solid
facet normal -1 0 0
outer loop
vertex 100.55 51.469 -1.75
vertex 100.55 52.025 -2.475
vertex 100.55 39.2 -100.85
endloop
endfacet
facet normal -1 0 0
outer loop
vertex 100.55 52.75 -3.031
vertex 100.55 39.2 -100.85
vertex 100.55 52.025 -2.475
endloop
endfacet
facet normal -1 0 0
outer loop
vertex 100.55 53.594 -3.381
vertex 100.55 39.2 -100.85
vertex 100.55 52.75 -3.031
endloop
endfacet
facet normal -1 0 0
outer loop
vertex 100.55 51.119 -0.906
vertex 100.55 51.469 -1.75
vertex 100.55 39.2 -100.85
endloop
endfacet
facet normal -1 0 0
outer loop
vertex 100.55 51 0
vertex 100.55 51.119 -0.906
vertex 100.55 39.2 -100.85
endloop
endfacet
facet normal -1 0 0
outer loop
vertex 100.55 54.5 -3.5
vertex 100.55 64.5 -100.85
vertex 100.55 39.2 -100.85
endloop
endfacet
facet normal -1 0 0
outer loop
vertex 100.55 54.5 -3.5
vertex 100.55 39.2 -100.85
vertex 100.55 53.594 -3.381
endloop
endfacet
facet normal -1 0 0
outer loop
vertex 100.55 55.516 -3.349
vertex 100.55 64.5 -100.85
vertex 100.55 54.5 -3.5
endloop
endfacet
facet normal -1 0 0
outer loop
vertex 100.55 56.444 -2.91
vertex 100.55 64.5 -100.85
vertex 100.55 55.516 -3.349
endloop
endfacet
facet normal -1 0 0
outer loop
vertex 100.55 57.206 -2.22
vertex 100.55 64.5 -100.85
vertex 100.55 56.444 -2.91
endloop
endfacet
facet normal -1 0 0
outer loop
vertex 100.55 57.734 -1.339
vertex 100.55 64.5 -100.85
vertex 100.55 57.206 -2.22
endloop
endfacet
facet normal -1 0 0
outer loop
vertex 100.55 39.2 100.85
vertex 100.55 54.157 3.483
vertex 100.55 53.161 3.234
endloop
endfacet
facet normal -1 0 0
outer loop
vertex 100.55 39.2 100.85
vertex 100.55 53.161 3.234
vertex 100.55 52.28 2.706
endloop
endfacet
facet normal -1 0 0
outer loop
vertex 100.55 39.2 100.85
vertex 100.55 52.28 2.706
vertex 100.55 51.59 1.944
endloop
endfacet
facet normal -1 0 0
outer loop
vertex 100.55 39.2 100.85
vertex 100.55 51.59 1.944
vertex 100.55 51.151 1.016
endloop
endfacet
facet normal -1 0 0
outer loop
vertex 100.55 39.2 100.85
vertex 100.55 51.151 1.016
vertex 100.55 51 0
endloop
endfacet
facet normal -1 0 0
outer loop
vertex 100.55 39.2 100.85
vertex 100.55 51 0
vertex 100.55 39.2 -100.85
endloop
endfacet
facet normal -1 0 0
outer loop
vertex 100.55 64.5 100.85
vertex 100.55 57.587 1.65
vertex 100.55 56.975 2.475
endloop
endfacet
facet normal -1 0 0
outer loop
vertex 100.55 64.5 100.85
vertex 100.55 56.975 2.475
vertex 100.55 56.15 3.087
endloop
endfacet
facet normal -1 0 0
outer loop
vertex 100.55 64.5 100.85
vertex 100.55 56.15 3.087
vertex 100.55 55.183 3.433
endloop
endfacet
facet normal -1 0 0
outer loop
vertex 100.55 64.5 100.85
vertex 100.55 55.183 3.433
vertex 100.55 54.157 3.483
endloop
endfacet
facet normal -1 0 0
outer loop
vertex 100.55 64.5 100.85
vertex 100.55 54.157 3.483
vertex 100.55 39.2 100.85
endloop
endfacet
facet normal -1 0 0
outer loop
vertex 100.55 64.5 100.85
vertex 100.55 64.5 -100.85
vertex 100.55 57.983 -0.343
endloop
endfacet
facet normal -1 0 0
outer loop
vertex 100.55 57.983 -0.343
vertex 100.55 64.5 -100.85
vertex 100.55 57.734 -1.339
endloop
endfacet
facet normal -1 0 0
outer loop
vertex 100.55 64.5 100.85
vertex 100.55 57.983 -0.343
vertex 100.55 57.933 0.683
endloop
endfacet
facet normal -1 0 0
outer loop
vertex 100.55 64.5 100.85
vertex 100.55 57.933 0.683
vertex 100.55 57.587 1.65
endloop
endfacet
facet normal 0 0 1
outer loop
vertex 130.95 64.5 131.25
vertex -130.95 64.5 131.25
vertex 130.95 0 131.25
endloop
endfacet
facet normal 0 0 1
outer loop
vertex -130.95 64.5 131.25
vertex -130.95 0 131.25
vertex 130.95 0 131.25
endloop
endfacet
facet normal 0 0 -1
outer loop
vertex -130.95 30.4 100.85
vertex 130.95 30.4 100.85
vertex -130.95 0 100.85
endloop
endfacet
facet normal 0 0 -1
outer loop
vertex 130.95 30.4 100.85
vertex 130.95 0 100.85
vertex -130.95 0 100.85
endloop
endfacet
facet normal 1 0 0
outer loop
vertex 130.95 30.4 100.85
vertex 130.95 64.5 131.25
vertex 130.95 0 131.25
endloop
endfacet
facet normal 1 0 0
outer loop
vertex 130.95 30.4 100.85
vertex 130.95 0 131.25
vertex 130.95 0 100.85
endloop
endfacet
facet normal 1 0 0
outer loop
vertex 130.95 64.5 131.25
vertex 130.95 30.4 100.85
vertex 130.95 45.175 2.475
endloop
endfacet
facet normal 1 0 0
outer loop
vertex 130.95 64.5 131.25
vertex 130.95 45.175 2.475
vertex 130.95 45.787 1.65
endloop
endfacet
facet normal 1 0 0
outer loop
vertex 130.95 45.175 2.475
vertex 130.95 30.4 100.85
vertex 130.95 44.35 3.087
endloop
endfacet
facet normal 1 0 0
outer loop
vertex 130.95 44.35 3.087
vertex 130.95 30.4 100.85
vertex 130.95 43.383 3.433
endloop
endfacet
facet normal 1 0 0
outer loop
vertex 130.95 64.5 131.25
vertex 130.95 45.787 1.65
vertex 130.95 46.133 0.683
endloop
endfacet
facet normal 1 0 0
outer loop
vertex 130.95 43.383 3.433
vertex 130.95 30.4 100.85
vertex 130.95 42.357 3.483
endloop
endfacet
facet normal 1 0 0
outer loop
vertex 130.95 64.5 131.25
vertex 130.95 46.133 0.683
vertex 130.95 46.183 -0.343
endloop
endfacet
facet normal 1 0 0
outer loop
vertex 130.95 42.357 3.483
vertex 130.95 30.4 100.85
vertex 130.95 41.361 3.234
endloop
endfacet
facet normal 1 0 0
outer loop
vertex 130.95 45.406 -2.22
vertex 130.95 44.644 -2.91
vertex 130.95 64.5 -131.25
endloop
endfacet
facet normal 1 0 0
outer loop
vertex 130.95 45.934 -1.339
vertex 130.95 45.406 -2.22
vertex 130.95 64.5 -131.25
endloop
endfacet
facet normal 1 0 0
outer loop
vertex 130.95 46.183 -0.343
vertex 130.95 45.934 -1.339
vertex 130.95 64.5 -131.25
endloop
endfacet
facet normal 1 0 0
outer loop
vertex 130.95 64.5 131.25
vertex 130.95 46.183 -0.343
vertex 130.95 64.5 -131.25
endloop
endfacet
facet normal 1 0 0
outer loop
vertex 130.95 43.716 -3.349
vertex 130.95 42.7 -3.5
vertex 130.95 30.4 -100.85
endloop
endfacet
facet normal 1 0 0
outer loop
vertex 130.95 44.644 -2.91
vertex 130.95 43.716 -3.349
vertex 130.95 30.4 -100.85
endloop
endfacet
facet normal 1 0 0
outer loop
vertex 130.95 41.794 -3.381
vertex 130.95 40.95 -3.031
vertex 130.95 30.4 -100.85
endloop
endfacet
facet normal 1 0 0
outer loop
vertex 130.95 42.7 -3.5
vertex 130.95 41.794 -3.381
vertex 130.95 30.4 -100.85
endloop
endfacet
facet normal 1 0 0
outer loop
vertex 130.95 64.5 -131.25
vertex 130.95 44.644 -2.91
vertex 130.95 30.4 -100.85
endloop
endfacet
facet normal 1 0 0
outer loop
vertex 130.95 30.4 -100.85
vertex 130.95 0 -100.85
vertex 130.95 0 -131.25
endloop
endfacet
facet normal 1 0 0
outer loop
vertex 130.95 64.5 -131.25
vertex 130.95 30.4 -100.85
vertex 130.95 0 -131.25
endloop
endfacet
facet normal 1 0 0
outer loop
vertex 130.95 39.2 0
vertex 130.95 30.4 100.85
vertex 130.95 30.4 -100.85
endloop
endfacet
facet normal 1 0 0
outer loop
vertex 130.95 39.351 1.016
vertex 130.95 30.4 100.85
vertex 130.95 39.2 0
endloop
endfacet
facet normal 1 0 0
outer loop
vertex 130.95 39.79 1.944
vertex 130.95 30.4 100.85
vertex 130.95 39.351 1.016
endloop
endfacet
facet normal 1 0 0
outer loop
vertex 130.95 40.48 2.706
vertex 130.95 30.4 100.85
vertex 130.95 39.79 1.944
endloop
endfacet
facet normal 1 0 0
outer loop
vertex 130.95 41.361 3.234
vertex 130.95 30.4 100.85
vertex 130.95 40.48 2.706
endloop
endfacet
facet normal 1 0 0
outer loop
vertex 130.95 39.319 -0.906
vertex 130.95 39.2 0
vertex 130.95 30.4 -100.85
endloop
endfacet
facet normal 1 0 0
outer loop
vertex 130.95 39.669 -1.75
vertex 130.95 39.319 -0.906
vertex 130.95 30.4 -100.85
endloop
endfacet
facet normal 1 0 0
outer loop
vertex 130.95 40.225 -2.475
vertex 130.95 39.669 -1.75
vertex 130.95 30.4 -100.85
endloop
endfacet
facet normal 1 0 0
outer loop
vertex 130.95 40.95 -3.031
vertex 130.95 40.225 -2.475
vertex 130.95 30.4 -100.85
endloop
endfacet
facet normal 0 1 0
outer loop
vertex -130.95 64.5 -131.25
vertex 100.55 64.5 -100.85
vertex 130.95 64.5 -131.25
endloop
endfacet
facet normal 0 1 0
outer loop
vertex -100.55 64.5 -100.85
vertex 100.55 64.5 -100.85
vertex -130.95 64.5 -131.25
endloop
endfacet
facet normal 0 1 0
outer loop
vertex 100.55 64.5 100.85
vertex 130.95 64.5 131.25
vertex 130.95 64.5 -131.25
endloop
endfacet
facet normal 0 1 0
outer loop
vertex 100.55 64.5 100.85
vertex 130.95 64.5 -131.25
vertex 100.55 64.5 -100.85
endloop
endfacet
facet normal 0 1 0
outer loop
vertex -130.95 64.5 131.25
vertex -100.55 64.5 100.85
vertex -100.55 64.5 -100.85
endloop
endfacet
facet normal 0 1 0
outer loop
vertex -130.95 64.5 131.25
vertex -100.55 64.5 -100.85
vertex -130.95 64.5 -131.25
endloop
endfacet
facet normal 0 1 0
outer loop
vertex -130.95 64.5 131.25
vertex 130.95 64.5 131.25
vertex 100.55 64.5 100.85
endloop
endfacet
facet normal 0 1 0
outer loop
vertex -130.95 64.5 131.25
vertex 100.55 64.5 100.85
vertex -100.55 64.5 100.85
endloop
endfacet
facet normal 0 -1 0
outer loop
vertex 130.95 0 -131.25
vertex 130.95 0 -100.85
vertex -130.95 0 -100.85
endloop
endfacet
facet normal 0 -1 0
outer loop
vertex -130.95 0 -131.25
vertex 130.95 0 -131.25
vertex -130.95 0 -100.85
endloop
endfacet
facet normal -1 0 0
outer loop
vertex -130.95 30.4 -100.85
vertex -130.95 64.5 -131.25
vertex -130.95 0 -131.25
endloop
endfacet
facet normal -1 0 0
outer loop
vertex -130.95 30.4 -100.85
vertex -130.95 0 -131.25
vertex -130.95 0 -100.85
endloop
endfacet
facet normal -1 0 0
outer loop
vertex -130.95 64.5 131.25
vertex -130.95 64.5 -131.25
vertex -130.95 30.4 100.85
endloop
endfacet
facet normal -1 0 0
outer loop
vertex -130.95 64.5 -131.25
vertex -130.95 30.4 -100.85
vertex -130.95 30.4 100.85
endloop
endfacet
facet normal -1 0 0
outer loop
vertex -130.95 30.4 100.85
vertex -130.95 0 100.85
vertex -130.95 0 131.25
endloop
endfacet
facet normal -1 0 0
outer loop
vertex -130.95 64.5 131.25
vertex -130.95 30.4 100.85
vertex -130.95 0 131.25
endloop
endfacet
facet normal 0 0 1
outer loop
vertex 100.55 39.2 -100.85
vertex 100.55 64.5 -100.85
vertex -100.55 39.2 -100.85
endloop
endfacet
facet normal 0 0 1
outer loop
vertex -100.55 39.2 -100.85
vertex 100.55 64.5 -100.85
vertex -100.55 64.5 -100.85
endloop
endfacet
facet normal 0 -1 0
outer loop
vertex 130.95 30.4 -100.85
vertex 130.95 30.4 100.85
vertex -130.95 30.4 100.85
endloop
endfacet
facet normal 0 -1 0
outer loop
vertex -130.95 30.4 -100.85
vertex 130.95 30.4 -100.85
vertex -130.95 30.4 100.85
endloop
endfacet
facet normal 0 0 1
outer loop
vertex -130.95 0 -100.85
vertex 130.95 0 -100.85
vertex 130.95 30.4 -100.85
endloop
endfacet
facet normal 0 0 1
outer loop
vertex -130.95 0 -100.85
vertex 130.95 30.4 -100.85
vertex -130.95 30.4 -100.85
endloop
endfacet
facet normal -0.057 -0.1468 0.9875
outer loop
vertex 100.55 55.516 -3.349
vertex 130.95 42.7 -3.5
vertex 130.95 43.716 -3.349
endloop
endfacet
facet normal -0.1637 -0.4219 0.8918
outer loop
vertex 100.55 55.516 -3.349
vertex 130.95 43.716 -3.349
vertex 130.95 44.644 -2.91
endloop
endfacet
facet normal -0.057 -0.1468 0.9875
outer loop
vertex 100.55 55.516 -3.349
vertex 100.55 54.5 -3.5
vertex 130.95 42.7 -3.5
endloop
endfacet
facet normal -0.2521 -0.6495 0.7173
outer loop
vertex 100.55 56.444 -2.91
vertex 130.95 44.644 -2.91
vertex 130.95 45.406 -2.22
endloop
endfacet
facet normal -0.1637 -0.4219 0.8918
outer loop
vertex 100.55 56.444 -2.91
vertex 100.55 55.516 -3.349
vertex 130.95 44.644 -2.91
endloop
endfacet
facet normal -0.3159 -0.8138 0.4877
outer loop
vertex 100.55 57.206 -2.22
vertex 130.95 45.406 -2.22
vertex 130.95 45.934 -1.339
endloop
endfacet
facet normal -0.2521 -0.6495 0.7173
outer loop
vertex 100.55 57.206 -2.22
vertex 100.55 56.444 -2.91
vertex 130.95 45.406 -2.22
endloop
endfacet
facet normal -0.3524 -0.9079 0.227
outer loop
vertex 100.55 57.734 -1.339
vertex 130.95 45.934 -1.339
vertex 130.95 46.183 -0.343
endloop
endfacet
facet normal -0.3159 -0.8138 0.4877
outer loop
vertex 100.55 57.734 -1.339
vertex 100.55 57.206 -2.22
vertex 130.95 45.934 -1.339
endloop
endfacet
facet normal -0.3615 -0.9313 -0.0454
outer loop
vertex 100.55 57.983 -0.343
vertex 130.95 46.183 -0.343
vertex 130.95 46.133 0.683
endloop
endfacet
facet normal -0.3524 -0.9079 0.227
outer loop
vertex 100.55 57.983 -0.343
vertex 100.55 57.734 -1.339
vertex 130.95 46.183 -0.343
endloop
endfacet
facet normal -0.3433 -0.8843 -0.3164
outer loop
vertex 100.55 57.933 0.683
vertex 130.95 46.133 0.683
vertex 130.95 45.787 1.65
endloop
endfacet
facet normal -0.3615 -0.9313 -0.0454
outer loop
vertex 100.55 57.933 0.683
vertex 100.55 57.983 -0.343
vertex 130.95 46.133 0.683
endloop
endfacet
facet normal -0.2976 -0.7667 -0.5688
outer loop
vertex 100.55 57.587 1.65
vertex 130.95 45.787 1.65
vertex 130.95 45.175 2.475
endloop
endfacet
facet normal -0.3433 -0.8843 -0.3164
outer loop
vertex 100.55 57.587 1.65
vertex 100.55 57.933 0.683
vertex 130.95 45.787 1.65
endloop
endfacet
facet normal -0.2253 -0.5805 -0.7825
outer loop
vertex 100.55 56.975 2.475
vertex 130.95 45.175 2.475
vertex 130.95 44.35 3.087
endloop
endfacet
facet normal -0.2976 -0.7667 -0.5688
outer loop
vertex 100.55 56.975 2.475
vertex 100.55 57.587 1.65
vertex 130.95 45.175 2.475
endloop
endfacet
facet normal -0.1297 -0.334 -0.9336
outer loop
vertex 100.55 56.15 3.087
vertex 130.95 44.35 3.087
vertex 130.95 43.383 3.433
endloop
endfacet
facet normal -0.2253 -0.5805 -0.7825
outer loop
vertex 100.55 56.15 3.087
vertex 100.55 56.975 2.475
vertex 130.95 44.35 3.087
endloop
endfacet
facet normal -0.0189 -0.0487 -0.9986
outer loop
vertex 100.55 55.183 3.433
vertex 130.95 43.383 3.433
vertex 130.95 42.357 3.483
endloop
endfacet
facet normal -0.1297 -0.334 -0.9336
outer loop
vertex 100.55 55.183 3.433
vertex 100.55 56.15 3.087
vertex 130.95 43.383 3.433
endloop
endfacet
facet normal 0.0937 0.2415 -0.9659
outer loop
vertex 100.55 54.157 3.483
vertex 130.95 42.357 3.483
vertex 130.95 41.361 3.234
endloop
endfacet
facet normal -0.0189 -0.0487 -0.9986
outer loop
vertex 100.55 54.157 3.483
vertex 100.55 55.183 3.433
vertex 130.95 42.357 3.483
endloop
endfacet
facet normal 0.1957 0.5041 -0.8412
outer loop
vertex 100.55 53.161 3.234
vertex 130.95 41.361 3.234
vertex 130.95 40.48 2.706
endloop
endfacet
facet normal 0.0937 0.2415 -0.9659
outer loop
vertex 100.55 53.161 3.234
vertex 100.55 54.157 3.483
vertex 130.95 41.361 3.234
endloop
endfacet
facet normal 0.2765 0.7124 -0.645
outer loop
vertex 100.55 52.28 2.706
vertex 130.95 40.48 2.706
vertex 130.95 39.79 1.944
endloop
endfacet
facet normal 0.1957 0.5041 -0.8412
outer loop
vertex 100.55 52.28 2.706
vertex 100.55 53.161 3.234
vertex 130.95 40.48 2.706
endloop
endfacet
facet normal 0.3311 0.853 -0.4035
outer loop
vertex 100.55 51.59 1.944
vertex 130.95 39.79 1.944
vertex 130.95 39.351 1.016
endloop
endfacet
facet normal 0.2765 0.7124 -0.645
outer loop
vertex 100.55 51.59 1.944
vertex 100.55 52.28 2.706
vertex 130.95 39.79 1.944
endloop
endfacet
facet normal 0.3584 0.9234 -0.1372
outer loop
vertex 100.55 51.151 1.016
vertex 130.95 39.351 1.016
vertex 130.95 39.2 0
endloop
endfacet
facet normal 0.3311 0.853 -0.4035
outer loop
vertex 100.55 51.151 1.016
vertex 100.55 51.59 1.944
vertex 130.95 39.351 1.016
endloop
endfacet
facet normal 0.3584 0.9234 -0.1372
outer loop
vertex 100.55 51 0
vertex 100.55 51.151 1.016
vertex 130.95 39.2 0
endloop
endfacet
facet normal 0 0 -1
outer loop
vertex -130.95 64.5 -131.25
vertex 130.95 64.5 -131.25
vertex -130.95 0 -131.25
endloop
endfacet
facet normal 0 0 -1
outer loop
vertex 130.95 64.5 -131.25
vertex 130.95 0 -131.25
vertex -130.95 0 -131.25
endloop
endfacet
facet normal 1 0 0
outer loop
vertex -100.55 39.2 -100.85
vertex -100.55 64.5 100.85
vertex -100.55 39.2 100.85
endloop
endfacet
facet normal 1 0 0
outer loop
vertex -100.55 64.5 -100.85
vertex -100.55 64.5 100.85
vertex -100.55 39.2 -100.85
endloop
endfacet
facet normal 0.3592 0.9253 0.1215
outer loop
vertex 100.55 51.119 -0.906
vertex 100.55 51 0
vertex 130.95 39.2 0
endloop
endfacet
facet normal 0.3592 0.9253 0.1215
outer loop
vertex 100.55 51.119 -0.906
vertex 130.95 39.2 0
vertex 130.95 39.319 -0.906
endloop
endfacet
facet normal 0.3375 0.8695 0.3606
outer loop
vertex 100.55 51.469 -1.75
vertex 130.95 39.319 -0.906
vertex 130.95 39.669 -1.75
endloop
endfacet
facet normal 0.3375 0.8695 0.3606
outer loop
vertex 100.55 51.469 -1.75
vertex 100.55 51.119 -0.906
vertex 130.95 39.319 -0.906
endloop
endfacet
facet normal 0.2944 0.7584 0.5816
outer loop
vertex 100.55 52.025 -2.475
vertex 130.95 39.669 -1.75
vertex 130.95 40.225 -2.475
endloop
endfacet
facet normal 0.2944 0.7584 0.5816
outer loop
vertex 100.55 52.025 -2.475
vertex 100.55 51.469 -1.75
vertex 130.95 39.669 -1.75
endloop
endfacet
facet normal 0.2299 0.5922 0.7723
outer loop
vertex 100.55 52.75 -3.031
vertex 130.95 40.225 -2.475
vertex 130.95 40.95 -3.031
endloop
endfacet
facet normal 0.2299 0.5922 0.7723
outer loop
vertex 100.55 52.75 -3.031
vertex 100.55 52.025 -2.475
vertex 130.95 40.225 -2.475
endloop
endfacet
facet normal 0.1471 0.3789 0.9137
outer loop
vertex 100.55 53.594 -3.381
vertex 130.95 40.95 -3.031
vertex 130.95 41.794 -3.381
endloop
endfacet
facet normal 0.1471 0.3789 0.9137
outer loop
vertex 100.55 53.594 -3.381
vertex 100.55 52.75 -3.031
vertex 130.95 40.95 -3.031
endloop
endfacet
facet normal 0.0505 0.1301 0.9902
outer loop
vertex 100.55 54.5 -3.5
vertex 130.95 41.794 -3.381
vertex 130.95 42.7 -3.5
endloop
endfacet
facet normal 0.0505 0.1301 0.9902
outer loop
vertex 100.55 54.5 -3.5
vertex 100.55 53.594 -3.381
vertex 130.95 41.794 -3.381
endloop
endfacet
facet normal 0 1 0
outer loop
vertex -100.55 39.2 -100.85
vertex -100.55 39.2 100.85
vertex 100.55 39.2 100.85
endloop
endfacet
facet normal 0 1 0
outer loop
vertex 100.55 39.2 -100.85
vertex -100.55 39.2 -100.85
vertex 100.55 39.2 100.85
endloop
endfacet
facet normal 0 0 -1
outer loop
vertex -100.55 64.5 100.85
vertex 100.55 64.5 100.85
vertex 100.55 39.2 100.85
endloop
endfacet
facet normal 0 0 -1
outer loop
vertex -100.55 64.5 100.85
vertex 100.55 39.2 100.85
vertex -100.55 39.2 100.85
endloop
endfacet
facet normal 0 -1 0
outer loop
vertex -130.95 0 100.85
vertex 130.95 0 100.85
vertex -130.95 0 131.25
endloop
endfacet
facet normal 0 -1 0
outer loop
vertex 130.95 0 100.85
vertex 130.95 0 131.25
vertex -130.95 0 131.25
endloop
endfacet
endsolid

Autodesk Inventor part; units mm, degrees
ref_plane "YZ Plane" through (0, 0, 0) normal (1, 0, 0) x (0, 1, 0)
ref_plane "XZ Plane" through (0, 0, 0) normal (0, 1, 0) x (-1, 0, 0)
ref_plane "XY Plane" through (0, 0, 0) normal (0, 0, 1) x (1, 0, 0)
sketch "Esboço1" plane through (0, 0, 0) normal (0, 1, 0) x (-1, 0, 0)
  line L0 (130.95, 131.25) -> (-130.95, 131.25)
  line L1 (-130.95, 131.25) -> (-130.95, -131.25)
  line L2 (-130.95, -131.25) -> (130.95, -131.25)
  line L3 (130.95, -131.25) -> (130.95, 131.25)
  line L4 (130.95, 131.25) -> (-130.95, -131.25) construction
  line L5 (-130.95, 131.25) -> (130.95, -131.25) construction
  line L6 (-100.55, 100.85) -> (100.55, 100.85)
  line L7 (100.55, 100.85) -> (100.55, -100.85)
  line L8 (100.55, -100.85) -> (-100.55, -100.85)
  line L9 (-100.55, -100.85) -> (-100.55, 100.85)
  line L10 (100.55, 100.85) -> (130.95, 100.85)
  line L11 (-100.55, 100.85) -> (-130.95, 100.85)
  line L12 (100.55, -100.85) -> (130.95, -100.85)
  line L13 (-100.55, -100.85) -> (-130.95, -100.85)
  point P0 (0, 0)
  dimension "d0" = 261.9
  dimension "d1" = 262.5
  dimension "d2" = 30.4
extrude "Extrusão1" add sketch "Esboço1" along normal blind 64.5
extrude "Extrusão2" cut sketch "Esboço1" along normal blind 30.4 contours L3 L12 L7 L10 | L11 L9 L13 L1 | L7 L8 L9 L6
sketch "Esboço2" plane through (0, 64.5, 0) normal (0, 1, 0) x (1, 0, 0)
  line L0 (130.95, 131.25) -> (-130.95, 131.25) projected
  line L1 (-130.95, 131.25) -> (-130.95, -131.25) projected
  line L2 (-130.95, -131.25) -> (130.95, -131.25) projected
  line L3 (130.95, -131.25) -> (130.95, 131.25) projected
  line L4 (130.95, -131.25) -> (130.95, 131.25) projected
  line L5 (100.55, 100.85) -> (100.55, -100.85) projected
  line L6 (100.55, -100.85) -> (-100.55, -100.85) projected
  line L7 (-100.55, -100.85) -> (-100.55, 100.85) projected
  line L8 (130.95, 100.85) -> (-130.95, 100.85) projected
  point P0 (0, 0)
extrude "Extrusão3" cut sketch "Esboço2" against normal blind 25.3 contours L5 L6 L7 L8
sketch "Esboço3" plane through (130.95, 0, -131.25) normal (1, 0, 0) x (0, 0, -1)
  line L0 (-232.1, 30.4) -> (-30.4, 30.4) projected
  line L1 (-131.25, 30.4) -> (-131.25, 64.5) construction
  line L2 (-262.5, 64.5) -> (0, 64.5) projected
  line L3 (-232.1, 0) -> (-232.1, 30.4) projected
  line L4 (-232.1, 30.4) -> (-30.4, 30.4) projected
  line L5 (-30.4, 30.4) -> (-30.4, 0) projected
  line L6 (-30.4, 0) -> (0, 0) projected
  line L7 (0, 0) -> (0, 64.5) projected
  line L8 (-262.5, 64.5) -> (0, 64.5) projected
  line L9 (-262.5, 0) -> (-262.5, 64.5) projected
  line L10 (-262.5, 0) -> (-232.1, 0) projected
  line L11 (-232.1, 39.2) -> (-30.4, 39.2) projected
  circle A0 centre (-131.25, 42.7) radius 3.5
  point P0 (-131.25, 0)
  dimension "d9" = 7
sketch "Esboço4" plane through (100.55, 64.5, -100.85) normal (-1, 0, 0) x (0, 0, 1)
  circle A0 centre (100.85, -21.8) radius 3.5 projected
  circle A1 centre (100.85, -10) radius 3.5
  line L0 (232.1, 0) -> (-30.4, 0) projected
  line L1 (100.85, 0) -> (100.85, -10) construction
  point P0 (100.85, -64.5)
  dimension "d10" = 7
  dimension "d11" = 10
sketch3d "Esboço 3D1"
  line L0 (130.95, 42.7, 0) -> (100.55, 54.5, 0)
sweep "Varredura1" cut profiles "Esboço3" path "Esboço 3D1" contours A0
properties part number "FundoColmeia"
